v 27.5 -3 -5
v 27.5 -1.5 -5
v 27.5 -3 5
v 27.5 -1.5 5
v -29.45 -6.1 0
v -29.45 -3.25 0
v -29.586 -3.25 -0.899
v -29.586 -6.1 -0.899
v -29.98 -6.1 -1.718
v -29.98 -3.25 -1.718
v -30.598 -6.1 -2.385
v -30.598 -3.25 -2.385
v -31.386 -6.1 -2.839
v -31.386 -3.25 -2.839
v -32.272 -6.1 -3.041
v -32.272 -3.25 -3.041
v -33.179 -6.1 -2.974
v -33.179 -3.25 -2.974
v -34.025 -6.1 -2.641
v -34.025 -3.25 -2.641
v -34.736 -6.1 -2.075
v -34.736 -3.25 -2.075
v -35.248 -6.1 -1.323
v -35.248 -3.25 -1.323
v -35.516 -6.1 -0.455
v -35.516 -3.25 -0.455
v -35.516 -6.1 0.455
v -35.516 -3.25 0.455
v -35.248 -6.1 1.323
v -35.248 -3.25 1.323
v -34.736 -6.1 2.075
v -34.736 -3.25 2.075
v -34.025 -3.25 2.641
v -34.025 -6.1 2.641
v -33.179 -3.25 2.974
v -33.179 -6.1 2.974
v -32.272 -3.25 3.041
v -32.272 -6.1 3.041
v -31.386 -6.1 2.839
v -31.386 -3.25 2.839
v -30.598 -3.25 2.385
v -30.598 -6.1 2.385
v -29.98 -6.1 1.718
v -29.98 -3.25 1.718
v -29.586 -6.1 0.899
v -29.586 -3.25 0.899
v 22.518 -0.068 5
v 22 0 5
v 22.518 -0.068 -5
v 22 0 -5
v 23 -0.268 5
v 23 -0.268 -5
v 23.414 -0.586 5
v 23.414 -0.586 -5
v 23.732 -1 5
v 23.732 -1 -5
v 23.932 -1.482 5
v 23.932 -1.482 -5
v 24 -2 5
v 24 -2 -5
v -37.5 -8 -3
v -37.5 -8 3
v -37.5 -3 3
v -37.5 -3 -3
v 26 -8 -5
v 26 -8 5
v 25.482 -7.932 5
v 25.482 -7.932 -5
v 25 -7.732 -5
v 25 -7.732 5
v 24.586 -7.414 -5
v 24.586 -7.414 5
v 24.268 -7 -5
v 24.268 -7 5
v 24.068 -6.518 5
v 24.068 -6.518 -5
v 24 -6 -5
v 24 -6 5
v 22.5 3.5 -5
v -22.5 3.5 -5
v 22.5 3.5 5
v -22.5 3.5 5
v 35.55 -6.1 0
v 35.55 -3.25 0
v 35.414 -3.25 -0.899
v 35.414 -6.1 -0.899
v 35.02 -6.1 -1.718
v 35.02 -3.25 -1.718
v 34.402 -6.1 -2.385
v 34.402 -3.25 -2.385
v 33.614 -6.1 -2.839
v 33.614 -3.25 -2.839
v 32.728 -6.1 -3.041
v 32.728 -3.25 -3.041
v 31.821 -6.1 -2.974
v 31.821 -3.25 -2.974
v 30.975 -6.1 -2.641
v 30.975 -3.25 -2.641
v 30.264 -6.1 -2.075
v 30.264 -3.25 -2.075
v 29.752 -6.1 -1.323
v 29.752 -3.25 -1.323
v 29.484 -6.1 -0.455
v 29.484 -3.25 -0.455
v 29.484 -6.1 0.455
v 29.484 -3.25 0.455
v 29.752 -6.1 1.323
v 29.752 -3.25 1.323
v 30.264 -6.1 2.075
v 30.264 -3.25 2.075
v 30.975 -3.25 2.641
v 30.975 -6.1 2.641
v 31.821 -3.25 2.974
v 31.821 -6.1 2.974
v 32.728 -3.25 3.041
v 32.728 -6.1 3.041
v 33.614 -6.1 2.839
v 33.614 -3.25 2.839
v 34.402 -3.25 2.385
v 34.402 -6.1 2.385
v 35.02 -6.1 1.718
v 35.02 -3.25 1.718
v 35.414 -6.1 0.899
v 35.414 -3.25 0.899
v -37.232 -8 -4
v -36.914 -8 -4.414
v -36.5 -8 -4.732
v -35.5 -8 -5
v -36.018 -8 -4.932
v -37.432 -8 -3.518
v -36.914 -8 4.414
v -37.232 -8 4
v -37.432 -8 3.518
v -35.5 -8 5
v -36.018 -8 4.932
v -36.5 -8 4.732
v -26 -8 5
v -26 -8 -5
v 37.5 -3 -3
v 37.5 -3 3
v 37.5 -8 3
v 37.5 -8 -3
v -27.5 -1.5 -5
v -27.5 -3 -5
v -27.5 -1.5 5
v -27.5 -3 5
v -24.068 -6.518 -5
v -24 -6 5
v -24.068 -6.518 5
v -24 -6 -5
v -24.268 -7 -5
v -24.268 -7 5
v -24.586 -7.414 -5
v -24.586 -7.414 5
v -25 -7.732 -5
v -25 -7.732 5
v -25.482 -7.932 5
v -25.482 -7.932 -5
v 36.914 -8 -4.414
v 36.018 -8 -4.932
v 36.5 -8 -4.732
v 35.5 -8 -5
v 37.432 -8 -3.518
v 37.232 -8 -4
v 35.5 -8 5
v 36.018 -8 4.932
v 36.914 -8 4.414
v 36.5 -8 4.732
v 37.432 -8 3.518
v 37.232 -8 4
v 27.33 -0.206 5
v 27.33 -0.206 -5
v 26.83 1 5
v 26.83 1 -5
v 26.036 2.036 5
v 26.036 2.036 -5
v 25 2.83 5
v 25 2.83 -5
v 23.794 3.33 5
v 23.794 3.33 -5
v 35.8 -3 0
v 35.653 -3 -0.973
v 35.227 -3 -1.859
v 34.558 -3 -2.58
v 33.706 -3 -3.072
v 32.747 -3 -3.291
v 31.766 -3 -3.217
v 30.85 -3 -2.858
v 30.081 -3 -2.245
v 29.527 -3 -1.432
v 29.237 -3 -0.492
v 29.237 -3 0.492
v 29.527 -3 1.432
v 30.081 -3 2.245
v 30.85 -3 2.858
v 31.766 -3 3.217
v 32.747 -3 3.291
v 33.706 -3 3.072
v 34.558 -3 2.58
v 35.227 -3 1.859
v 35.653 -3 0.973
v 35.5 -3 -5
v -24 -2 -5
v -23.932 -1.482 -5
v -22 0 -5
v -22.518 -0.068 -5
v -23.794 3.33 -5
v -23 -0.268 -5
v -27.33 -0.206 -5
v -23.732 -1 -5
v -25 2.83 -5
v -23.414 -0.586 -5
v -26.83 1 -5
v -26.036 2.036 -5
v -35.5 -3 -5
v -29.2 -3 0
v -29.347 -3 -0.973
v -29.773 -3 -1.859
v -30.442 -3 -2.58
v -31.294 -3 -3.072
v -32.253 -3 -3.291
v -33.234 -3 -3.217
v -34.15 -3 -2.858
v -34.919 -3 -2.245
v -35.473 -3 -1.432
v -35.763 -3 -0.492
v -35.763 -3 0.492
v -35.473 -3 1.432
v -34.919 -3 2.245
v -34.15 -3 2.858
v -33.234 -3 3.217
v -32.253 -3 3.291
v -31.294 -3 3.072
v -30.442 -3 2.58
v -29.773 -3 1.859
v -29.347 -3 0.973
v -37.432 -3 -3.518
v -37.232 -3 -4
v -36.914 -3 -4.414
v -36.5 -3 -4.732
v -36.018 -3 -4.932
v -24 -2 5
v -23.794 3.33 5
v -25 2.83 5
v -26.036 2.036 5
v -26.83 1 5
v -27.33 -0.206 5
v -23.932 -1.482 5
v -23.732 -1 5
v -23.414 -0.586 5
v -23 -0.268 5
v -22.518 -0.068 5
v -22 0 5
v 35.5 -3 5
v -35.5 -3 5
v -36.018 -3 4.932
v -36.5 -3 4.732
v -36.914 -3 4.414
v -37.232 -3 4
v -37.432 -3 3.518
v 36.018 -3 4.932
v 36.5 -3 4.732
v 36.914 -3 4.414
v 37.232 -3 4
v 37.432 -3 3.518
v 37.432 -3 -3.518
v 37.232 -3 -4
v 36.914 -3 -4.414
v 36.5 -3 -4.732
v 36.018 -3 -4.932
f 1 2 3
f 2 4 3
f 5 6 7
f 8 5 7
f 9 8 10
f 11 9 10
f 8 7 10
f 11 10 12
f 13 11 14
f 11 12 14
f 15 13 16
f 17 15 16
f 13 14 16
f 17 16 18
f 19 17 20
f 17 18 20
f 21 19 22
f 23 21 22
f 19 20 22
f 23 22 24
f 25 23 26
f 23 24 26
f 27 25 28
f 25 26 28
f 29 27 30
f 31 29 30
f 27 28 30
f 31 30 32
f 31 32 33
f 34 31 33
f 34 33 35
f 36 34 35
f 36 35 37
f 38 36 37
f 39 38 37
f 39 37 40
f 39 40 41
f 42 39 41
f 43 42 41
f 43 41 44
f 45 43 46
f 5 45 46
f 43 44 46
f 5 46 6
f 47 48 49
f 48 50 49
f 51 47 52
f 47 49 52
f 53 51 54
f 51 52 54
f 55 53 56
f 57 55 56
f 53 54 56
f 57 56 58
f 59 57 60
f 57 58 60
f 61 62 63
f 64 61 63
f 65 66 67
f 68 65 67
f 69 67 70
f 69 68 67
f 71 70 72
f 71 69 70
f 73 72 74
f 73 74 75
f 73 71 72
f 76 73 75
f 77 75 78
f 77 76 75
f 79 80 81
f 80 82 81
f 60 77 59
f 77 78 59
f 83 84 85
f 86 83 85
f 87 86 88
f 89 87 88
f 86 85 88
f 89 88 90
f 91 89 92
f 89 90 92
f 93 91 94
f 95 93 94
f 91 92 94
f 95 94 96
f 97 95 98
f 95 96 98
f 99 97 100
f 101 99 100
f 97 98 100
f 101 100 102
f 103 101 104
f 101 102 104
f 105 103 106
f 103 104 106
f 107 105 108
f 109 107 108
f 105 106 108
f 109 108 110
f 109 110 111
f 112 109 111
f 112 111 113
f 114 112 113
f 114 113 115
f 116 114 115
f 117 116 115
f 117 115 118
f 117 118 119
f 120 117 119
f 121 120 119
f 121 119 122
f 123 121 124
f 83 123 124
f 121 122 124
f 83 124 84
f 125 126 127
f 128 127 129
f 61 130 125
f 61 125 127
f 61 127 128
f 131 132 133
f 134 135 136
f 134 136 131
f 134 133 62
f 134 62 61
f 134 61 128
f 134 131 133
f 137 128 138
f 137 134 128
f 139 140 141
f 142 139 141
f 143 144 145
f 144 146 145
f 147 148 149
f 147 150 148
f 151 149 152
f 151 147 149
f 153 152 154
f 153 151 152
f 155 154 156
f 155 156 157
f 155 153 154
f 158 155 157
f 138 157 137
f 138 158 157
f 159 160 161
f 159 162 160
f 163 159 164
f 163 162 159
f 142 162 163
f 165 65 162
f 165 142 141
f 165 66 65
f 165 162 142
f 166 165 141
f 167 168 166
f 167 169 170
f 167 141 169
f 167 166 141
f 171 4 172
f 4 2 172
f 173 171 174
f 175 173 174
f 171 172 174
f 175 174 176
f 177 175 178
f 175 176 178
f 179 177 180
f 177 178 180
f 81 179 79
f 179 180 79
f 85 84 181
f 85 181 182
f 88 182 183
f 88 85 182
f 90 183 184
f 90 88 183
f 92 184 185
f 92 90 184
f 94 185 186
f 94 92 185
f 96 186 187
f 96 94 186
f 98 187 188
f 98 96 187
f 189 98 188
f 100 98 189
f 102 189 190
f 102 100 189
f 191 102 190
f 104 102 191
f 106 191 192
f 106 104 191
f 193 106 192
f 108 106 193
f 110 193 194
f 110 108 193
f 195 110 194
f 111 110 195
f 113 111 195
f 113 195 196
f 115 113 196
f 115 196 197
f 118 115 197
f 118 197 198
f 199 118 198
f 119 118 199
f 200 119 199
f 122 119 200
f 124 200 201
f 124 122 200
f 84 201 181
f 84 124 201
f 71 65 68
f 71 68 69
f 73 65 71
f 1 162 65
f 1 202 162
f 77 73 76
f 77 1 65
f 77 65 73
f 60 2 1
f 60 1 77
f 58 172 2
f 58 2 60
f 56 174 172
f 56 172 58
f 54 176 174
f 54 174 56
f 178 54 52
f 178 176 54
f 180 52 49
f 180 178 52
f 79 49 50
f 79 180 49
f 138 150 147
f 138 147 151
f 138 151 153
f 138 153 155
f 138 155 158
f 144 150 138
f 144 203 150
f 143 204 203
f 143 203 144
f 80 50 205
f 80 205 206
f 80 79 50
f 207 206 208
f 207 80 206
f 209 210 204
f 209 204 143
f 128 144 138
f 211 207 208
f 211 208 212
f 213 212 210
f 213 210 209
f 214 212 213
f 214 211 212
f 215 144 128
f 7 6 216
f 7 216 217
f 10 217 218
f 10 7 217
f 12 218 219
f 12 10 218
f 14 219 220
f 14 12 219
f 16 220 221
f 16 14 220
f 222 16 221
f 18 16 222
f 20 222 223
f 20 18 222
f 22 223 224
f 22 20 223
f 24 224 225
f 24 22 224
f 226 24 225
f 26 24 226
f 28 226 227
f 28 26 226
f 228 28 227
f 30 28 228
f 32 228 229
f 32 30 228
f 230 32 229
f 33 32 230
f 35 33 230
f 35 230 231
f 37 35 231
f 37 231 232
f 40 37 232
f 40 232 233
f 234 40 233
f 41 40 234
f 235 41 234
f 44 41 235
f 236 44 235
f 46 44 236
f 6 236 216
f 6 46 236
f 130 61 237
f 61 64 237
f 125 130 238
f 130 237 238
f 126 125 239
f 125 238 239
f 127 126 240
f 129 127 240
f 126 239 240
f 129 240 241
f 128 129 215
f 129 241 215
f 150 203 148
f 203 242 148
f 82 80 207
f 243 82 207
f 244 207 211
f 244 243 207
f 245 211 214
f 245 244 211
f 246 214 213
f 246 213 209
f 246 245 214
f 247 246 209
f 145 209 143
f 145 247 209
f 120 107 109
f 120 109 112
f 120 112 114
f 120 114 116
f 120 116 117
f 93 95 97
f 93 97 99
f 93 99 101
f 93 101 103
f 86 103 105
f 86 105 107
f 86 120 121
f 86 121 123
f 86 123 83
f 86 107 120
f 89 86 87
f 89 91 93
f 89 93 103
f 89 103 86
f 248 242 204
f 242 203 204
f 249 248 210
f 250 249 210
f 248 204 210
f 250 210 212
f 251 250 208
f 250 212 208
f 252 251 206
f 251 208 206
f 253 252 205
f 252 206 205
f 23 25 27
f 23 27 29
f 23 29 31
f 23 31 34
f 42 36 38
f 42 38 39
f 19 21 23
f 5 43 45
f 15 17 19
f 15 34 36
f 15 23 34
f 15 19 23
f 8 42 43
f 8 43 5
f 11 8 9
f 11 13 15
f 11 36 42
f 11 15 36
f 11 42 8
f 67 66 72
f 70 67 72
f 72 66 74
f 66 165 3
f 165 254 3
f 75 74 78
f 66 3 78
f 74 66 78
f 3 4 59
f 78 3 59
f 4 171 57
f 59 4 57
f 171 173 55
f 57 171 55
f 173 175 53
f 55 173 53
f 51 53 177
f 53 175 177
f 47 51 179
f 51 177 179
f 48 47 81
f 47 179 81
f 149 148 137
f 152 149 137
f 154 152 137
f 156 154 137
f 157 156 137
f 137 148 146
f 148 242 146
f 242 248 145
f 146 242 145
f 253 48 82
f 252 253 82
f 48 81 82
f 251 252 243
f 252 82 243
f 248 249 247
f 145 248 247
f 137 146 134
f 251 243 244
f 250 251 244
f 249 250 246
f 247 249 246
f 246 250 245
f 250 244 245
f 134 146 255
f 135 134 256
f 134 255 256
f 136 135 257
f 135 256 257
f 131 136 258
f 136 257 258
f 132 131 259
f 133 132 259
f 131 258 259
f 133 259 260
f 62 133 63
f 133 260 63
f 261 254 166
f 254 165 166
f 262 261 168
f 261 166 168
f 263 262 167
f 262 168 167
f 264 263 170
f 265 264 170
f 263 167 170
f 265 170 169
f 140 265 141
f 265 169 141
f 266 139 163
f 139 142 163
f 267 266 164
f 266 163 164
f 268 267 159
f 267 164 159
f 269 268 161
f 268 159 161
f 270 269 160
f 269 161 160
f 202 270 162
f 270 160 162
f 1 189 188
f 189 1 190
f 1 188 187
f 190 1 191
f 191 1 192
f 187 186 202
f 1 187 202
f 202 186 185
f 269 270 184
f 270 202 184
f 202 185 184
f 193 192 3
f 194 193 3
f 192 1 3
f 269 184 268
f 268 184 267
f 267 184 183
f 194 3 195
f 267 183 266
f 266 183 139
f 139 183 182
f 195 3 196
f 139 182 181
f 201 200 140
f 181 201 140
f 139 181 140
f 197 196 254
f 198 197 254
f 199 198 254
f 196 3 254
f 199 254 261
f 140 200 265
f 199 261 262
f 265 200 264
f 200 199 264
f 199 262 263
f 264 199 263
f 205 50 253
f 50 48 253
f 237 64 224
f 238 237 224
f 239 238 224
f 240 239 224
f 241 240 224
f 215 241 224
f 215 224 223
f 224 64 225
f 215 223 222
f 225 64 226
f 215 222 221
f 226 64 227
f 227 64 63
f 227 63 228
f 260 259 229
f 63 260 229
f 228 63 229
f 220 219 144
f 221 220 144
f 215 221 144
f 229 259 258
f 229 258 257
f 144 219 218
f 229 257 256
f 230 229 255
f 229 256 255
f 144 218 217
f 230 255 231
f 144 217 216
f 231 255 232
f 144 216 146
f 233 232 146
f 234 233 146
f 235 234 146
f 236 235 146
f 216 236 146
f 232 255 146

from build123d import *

# Parameters (mm, degrees)
BOSS_EXTRUDE1_DEPTH = 5
FILLET1_R           = 2
FILLET2_R           = 5
FILLET3_R           = 2
FILLET4_R           = 2
SKETCH3_R           = 3.05
CUT_EXTRUDE1_DEPTH  = 3.1
CHAMFER1_SIZE       = 0.25


with BuildPart() as part:
    # Sketch1 → Boss-Extrude1 (new body, symmetric)
    with BuildSketch(Plane.XY):
        Polygon((-27.5, 3.5), (27.5, 3.5), (27.5, -3), (37.5, -3), (37.5, -8), (27.5, -8), (24, -8), (24, 0), (-24, 0), (-24, -8), (-27.5, -8), (-37.5, -8), (-37.5, -3), (-27.5, -3), align=None)
    extrude(amount=BOSS_EXTRUDE1_DEPTH, both=True)

    # Fillet1
    fillet1_edges = [part.edges().sort_by_distance(p)[0] for p in [
        (24, 0, 0),
        (-24, 0, 0),
    ]]
    fillet(fillet1_edges, radius=FILLET1_R)

    # Fillet2
    fillet2_edges = [part.edges().sort_by_distance(p)[0] for p in [
        (-27.5, 3.5, 0),
        (27.5, 3.5, 0),
    ]]
    fillet(fillet2_edges, radius=FILLET2_R)

    # Fillet3
    fillet3_edges = [part.edges().sort_by_distance(p)[0] for p in [
        (37.5, -5.5, -5),
        (-37.5, -5.5, -5),
        (-37.5, -5.5, 5),
        (37.5, -5.5, 5),
    ]]
    fillet(fillet3_edges, radius=FILLET3_R)

    # Fillet4
    fillet4_edges = [part.edges().sort_by_distance(p)[0] for p in [
        (24, -8, 0),
        (-24, -8, 0),
    ]]
    fillet(fillet4_edges, radius=FILLET4_R)

    # Sketch3 → Cut-Extrude1 (cut)
    with BuildSketch(Plane(origin=(0, -3, 0), x_dir=(1, 0, 0), z_dir=(0, 1, 0))):
        with Locations((32.5, 0)):
            Circle(SKETCH3_R)
        with Locations((-32.5, 0)):
            Circle(SKETCH3_R)
    extrude(amount=-CUT_EXTRUDE1_DEPTH, mode=Mode.SUBTRACT)

    # Chamfer1
    chamfer1_edges = [part.edges().sort_by_distance(p)[0] for p in [
        (29.45, -3, 0),
        (-35.55, -3, 0),
    ]]
    chamfer(chamfer1_edges, length=CHAMFER1_SIZE)


solid = part.part
